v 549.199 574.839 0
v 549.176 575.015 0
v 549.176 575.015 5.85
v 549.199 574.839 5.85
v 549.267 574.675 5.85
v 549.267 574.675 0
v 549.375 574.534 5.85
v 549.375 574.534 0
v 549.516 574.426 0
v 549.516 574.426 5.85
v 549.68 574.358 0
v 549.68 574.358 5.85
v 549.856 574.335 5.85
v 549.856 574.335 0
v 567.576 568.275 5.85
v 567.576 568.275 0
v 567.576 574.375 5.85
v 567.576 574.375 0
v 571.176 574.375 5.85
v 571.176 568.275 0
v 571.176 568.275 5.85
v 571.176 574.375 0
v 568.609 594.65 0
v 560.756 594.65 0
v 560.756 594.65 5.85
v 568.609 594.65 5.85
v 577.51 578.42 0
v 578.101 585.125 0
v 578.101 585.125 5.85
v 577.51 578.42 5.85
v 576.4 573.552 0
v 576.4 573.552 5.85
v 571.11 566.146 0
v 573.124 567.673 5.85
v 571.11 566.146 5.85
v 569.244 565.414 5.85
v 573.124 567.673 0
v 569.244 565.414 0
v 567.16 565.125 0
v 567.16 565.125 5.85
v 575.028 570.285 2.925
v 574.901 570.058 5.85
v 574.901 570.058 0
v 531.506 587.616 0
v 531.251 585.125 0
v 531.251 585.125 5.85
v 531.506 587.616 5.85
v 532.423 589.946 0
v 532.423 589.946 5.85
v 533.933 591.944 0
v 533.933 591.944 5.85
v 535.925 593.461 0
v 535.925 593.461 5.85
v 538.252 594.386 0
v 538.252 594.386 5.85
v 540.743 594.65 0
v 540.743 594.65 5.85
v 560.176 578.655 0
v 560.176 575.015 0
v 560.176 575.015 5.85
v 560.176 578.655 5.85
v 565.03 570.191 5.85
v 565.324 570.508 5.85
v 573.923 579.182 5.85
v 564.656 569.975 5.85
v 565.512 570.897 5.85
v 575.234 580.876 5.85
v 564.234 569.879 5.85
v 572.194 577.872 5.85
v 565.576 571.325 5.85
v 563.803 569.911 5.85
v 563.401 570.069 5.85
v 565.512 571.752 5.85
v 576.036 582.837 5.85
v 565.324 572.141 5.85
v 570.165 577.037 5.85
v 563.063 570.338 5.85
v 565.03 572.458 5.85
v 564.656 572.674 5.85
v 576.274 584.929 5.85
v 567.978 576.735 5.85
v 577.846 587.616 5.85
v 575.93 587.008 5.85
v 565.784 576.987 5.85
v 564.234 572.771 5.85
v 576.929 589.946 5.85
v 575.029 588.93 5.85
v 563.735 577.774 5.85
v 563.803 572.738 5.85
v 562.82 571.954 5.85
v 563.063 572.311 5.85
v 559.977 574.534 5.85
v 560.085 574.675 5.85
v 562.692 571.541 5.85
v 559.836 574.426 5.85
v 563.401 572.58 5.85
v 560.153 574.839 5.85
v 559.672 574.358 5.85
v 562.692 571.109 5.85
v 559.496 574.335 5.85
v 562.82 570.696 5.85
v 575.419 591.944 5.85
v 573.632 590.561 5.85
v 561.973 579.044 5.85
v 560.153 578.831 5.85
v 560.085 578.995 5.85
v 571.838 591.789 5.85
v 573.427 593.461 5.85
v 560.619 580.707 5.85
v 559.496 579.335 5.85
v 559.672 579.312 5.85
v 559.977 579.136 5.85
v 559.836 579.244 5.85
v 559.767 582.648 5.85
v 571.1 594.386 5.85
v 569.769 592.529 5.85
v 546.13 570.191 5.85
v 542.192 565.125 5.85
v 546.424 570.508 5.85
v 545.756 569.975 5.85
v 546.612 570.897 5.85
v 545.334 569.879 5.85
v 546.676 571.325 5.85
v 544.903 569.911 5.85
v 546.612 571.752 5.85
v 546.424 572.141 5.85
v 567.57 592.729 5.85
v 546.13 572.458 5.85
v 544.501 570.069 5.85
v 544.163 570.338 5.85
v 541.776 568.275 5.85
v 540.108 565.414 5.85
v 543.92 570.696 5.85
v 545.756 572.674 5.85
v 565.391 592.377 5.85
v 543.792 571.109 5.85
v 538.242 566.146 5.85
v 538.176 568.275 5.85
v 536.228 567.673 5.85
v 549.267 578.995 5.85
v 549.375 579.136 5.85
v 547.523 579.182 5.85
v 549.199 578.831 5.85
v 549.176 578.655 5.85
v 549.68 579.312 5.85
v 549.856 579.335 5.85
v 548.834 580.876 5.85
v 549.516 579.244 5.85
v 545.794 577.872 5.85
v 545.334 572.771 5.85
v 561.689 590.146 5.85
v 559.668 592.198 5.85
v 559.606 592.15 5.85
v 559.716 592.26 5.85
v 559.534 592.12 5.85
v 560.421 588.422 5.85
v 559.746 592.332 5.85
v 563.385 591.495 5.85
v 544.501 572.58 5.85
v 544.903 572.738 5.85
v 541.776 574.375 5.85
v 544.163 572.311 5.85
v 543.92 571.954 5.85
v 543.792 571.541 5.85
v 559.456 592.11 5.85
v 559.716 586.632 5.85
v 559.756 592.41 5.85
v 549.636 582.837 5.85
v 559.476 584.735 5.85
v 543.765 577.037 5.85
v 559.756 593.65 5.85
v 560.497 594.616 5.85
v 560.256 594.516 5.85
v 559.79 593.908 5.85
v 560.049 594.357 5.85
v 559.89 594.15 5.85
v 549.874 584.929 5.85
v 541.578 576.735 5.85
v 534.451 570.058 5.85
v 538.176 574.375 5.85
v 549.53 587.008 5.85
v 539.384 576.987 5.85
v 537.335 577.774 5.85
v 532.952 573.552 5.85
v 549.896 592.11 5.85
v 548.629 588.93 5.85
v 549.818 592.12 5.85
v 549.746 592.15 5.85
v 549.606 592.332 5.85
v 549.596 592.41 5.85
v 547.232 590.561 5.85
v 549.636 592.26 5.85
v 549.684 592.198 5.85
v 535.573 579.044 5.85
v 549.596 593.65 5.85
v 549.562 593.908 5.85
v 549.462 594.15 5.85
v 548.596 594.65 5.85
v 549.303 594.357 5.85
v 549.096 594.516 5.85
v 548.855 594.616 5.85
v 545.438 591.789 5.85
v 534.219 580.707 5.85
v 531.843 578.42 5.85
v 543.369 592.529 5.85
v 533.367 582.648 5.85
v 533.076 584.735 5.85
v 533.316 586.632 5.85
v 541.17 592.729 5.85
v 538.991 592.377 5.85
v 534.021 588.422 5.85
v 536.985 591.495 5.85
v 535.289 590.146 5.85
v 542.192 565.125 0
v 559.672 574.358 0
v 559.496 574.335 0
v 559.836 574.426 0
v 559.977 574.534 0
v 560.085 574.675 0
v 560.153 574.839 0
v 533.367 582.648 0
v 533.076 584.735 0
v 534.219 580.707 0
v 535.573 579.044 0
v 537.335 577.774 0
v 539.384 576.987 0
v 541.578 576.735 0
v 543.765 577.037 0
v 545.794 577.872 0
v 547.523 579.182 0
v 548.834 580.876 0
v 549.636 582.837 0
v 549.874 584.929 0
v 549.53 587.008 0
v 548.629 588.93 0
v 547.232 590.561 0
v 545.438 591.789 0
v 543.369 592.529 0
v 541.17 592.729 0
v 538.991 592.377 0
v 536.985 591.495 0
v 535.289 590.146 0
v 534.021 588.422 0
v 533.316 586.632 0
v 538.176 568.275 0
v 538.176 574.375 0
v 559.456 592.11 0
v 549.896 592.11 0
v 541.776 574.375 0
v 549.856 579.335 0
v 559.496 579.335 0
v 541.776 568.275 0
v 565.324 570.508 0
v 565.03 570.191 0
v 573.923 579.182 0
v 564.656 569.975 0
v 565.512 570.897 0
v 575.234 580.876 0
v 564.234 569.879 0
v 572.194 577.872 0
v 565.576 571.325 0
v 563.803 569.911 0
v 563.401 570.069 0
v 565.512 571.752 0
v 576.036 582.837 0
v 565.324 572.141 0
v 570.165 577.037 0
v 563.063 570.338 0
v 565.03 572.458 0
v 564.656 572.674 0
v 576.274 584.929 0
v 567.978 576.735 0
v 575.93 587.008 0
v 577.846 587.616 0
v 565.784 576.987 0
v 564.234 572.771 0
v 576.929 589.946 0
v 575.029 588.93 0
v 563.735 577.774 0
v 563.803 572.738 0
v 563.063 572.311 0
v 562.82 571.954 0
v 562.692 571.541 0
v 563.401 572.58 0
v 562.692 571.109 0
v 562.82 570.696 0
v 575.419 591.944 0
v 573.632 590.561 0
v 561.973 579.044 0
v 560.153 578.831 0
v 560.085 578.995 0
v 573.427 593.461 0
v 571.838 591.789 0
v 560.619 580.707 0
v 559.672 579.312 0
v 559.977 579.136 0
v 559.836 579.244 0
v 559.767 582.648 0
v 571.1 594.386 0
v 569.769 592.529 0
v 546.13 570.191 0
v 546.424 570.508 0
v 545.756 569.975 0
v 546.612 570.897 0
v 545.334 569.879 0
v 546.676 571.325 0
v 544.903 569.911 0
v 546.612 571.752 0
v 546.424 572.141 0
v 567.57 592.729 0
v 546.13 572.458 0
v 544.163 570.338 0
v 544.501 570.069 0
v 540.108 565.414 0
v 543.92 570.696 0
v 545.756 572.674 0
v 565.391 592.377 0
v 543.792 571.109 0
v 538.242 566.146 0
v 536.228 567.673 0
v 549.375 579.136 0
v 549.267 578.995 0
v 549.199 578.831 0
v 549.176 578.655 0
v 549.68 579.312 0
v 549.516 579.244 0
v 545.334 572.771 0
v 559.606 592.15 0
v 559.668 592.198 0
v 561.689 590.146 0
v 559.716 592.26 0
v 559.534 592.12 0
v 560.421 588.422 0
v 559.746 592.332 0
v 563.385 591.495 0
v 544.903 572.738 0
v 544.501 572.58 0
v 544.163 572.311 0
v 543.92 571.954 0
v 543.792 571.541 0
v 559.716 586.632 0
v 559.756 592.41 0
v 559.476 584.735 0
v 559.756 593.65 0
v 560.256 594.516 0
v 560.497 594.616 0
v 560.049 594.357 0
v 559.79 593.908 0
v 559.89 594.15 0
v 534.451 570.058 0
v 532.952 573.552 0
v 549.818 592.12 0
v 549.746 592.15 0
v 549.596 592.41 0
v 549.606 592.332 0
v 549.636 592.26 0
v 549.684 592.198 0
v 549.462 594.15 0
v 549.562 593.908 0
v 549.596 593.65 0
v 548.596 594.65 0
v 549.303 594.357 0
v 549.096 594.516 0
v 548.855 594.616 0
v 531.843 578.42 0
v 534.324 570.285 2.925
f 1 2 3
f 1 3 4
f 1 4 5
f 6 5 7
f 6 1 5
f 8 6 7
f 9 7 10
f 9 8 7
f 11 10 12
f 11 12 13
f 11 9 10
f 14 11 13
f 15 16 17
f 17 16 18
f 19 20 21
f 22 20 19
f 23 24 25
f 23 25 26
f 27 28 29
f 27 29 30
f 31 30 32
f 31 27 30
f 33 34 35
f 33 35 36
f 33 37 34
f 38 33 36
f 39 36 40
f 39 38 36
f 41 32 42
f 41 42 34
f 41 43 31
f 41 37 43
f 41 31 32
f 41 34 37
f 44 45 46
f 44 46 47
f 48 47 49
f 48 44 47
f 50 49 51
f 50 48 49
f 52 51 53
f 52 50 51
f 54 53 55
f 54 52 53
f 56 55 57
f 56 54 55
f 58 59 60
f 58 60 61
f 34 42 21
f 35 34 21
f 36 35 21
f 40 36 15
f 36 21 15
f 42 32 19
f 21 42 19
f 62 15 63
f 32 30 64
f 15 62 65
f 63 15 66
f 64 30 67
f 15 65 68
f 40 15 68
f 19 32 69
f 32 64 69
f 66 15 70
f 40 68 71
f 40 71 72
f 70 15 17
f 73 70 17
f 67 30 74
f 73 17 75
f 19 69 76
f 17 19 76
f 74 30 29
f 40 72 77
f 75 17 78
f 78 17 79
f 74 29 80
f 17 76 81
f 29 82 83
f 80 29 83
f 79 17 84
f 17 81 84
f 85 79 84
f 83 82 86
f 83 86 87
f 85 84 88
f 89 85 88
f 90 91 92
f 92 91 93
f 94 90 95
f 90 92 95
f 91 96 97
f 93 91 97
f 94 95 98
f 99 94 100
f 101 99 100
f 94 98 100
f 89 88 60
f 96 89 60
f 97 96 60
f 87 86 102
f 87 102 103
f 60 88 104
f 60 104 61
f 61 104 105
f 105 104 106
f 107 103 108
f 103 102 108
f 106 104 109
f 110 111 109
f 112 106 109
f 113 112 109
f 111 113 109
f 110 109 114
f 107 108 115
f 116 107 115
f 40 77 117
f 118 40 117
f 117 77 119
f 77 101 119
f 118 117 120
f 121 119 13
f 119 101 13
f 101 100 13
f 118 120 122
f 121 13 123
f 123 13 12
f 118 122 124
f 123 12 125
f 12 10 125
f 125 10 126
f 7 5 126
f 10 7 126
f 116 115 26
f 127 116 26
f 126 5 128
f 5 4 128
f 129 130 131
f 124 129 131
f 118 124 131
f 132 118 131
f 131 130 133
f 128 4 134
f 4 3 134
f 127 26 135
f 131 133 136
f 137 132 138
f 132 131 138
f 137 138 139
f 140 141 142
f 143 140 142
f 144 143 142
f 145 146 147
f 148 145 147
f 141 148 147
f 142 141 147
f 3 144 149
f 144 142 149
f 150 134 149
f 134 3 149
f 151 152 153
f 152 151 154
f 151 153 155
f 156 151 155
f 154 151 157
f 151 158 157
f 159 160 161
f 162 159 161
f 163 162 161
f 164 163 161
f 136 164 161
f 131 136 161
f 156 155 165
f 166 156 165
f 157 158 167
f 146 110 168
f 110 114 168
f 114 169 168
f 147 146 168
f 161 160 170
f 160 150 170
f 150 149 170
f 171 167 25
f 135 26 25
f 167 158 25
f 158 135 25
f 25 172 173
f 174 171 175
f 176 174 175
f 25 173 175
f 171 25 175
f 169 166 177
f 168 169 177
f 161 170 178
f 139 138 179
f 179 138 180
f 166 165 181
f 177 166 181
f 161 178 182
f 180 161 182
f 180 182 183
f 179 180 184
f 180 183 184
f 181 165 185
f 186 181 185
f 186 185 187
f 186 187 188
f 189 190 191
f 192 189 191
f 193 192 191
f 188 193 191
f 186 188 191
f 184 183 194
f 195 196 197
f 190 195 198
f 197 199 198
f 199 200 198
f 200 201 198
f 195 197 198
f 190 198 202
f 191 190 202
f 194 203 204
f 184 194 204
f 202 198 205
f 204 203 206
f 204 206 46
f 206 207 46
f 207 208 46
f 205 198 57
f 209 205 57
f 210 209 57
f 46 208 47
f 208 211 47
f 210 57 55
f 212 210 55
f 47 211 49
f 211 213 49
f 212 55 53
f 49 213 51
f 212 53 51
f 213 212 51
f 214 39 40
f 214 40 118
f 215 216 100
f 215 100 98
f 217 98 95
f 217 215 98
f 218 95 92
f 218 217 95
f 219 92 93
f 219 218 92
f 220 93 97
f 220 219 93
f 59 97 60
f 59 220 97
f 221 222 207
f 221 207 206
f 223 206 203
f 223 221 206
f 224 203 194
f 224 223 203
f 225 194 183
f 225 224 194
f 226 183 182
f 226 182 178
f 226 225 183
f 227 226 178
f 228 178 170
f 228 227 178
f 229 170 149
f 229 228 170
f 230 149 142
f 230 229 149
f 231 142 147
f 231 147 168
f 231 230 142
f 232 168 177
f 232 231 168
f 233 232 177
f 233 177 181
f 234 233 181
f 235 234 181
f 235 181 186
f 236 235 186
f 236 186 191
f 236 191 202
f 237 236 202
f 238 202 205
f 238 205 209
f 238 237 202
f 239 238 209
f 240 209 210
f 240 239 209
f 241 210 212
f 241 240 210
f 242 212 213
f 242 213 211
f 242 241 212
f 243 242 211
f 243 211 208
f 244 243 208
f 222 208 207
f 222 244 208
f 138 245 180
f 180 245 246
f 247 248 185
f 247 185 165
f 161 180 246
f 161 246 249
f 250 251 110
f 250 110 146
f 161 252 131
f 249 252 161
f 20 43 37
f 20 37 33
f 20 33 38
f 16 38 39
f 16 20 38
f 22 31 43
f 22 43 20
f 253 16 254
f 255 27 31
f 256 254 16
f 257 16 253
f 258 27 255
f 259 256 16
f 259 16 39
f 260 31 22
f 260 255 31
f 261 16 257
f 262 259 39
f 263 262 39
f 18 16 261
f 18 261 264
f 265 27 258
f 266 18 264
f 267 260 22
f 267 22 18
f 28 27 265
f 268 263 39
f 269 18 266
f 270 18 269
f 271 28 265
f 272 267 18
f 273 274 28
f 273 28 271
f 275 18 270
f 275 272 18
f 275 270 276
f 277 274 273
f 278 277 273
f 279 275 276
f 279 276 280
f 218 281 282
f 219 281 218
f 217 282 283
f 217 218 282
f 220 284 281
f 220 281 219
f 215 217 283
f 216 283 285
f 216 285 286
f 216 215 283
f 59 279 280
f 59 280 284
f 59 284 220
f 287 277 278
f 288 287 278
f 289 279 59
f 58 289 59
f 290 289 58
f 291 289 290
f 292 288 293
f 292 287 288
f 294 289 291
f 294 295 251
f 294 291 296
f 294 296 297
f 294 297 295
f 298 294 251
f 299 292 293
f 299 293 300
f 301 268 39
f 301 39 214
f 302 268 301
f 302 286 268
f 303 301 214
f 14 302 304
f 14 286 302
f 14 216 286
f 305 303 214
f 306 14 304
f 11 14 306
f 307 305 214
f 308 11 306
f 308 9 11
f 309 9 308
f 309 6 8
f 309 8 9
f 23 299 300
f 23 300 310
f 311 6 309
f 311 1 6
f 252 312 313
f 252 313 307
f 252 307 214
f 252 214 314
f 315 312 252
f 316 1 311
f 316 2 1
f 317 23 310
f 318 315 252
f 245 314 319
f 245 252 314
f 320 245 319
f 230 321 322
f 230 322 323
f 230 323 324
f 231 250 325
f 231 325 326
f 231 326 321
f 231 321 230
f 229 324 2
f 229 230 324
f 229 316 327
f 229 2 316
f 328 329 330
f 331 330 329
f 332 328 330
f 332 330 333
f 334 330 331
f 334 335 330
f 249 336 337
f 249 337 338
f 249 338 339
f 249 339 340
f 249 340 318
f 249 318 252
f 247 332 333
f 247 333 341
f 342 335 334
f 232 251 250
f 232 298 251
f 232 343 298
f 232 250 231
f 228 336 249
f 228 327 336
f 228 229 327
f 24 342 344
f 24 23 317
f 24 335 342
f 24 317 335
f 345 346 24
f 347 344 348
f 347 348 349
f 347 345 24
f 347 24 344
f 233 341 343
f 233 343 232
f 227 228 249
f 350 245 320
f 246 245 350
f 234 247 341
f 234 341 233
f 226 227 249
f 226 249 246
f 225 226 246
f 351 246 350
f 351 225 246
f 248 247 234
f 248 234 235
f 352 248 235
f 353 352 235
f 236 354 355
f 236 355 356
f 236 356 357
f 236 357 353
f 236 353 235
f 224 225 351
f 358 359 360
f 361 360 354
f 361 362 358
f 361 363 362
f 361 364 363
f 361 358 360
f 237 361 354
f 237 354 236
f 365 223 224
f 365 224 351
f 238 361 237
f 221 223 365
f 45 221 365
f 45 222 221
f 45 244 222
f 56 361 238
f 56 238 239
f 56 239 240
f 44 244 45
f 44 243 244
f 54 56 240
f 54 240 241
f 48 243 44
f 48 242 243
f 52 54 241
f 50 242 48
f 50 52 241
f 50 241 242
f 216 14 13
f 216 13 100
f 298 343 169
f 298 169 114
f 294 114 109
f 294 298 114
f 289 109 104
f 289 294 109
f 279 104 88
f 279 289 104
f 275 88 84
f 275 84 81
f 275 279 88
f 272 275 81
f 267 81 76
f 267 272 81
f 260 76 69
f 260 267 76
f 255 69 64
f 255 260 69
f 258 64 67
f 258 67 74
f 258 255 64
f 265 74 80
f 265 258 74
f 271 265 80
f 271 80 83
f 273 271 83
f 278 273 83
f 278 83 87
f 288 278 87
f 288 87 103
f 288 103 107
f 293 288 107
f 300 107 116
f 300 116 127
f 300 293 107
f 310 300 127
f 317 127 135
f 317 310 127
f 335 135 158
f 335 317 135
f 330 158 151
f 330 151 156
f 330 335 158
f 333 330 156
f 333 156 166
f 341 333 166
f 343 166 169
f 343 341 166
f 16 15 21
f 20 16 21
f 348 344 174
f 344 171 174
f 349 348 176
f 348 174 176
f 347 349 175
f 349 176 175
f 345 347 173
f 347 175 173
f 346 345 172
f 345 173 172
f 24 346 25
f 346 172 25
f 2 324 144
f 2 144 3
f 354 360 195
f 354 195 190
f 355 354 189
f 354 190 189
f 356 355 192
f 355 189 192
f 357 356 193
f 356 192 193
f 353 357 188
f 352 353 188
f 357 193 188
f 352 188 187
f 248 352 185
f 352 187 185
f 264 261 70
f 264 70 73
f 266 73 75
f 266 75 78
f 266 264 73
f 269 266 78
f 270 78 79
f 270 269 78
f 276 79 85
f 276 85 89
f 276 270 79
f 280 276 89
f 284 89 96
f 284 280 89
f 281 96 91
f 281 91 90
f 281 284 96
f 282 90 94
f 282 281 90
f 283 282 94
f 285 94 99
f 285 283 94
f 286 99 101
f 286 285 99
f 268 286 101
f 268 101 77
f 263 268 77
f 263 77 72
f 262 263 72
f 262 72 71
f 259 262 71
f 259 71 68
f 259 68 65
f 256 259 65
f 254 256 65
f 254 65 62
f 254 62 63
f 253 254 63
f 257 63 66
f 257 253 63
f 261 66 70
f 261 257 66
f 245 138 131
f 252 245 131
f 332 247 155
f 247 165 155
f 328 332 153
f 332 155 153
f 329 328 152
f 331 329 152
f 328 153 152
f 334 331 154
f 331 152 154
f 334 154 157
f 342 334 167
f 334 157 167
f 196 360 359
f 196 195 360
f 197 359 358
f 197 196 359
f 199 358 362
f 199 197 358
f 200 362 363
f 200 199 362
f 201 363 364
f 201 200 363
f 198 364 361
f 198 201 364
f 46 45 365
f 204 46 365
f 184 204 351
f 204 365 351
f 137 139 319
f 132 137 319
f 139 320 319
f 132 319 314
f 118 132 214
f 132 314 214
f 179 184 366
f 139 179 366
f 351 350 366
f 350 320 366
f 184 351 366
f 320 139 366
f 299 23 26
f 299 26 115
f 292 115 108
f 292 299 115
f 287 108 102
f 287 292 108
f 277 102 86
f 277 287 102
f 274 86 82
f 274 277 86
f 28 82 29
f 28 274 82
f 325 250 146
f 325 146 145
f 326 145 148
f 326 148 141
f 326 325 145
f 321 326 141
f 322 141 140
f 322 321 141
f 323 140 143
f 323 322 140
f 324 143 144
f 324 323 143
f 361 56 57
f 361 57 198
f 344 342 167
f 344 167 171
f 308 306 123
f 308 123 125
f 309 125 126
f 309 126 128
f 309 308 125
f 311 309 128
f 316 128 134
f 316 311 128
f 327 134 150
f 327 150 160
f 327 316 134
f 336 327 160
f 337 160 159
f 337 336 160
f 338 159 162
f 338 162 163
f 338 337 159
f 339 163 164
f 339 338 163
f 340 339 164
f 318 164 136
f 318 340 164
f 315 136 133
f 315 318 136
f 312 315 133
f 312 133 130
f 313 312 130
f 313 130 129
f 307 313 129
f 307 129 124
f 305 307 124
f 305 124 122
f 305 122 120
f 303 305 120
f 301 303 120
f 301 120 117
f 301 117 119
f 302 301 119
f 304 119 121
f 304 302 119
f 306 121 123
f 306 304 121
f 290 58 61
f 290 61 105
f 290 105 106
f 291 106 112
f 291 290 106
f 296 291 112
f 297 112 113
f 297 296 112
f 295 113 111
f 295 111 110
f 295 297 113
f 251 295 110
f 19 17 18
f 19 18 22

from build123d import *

# Parameters (mm, degrees)
MODEL_R             = 1.45
MODEL_RX            = 8.4
MODEL_RY            = 8
MODEL_W             = 3.6
MODEL_H             = 6.1
BOSS_EXTRUDE1_DEPTH = 5.85
FILLET1_R           = 0.3
FILLET2_R           = 1


with BuildPart() as part:
    # Model → Boss-Extrude1 (new body)
    with BuildSketch(Plane.XY):
        with BuildLine():
            Line((540.7427075, 594.649674665), (549.596103149, 594.649674665))
            Line((549.596103149, 594.649674665), (549.596103149, 592.109674665))
            Line((549.596103149, 592.109674665), (559.756103149, 592.109674665))
            Line((559.756103149, 592.109674665), (559.756103149, 594.649674665))
            Line((559.756103149, 594.649674665), (568.609498798, 594.649674665))
            ThreePointArc((568.609498798, 594.649674665), (575.419225536, 591.943953999), (578.10077955, 585.124674665))
            add(Edge.make_bspline(
                [(578.10077955, 585.124674665), (577.425296665, 565.444526899), (567.160030567, 565.124674665)],
                knots=[0, 0, 0, 1, 1, 1], degree=2))
            Line((567.160030567, 565.124674665), (542.192175731, 565.124674665))
            add(Edge.make_bspline(
                [(531.251426748, 585.124674665), (531.926909632, 565.444526899), (542.192175731, 565.124674665)],
                knots=[0, 0, 0, 1, 1, 1], degree=2))
            ThreePointArc((531.251426748, 585.124674665), (533.932980762, 591.943953999), (540.7427075, 594.649674665))
        make_face()
        with Locations((545.226103149, 571.324674665)):
            Circle(MODEL_R, mode=Mode.SUBTRACT)
        with Locations((564.126103149, 571.324674665)):
            Circle(MODEL_R, mode=Mode.SUBTRACT)
        with Locations(Location((541.476103149, 584.734674665), (0, 0, 180))):
            Ellipse(MODEL_RX, MODEL_RY, mode=Mode.SUBTRACT)
        with Locations(Location((567.876103149, 584.734674665), (0, 0, -180))):
            Ellipse(MODEL_RX, MODEL_RY, mode=Mode.SUBTRACT)
        with BuildLine():
            Line((549.856103149, 574.334674665), (554.676103149, 574.334674665))
            Line((554.676103149, 574.334674665), (559.496103149, 574.334674665))
            ThreePointArc((559.496103149, 574.334674665), (559.97693576, 574.533842054), (560.176103149, 575.014674665))
            Line((560.176103149, 575.014674665), (560.176103149, 578.654674665))
            ThreePointArc((560.176103149, 578.654674665), (559.97693576, 579.135507276), (559.496103149, 579.334674665))
            Line((559.496103149, 579.334674665), (554.676103149, 579.334674665))
            Line((554.676103149, 579.334674665), (549.856103149, 579.334674665))
            ThreePointArc((549.856103149, 579.334674665), (549.375270538, 579.135507276), (549.176103149, 578.654674665))
            Line((549.176103149, 578.654674665), (549.176103149, 575.014674665))
            ThreePointArc((549.176103149, 575.014674665), (549.375270538, 574.533842054), (549.856103149, 574.334674665))
        make_face(mode=Mode.SUBTRACT)
        with Locations((569.376103149, 571.324674665)):
            Rectangle(MODEL_W, MODEL_H, mode=Mode.SUBTRACT)
        with Locations((539.976103149, 571.324674665)):
            Rectangle(MODEL_W, MODEL_H, mode=Mode.SUBTRACT)
    extrude(amount=BOSS_EXTRUDE1_DEPTH)

    # Fillet1
    fillet1_edges = [part.edges().sort_by_distance(p)[0] for p in [
        (549.596103149, 592.109674665, 2.925),
        (559.756103149, 592.109674665, 2.925),
    ]]
    fillet(fillet1_edges, radius=FILLET1_R)

    # Fillet2
    fillet2_edges = [part.edges().sort_by_distance(p)[0] for p in [
        (549.596103149, 594.649674665, 2.925),
        (559.756103149, 594.649674665, 2.925),
    ]]
    fillet(fillet2_edges, radius=FILLET2_R)


solid = part.part
